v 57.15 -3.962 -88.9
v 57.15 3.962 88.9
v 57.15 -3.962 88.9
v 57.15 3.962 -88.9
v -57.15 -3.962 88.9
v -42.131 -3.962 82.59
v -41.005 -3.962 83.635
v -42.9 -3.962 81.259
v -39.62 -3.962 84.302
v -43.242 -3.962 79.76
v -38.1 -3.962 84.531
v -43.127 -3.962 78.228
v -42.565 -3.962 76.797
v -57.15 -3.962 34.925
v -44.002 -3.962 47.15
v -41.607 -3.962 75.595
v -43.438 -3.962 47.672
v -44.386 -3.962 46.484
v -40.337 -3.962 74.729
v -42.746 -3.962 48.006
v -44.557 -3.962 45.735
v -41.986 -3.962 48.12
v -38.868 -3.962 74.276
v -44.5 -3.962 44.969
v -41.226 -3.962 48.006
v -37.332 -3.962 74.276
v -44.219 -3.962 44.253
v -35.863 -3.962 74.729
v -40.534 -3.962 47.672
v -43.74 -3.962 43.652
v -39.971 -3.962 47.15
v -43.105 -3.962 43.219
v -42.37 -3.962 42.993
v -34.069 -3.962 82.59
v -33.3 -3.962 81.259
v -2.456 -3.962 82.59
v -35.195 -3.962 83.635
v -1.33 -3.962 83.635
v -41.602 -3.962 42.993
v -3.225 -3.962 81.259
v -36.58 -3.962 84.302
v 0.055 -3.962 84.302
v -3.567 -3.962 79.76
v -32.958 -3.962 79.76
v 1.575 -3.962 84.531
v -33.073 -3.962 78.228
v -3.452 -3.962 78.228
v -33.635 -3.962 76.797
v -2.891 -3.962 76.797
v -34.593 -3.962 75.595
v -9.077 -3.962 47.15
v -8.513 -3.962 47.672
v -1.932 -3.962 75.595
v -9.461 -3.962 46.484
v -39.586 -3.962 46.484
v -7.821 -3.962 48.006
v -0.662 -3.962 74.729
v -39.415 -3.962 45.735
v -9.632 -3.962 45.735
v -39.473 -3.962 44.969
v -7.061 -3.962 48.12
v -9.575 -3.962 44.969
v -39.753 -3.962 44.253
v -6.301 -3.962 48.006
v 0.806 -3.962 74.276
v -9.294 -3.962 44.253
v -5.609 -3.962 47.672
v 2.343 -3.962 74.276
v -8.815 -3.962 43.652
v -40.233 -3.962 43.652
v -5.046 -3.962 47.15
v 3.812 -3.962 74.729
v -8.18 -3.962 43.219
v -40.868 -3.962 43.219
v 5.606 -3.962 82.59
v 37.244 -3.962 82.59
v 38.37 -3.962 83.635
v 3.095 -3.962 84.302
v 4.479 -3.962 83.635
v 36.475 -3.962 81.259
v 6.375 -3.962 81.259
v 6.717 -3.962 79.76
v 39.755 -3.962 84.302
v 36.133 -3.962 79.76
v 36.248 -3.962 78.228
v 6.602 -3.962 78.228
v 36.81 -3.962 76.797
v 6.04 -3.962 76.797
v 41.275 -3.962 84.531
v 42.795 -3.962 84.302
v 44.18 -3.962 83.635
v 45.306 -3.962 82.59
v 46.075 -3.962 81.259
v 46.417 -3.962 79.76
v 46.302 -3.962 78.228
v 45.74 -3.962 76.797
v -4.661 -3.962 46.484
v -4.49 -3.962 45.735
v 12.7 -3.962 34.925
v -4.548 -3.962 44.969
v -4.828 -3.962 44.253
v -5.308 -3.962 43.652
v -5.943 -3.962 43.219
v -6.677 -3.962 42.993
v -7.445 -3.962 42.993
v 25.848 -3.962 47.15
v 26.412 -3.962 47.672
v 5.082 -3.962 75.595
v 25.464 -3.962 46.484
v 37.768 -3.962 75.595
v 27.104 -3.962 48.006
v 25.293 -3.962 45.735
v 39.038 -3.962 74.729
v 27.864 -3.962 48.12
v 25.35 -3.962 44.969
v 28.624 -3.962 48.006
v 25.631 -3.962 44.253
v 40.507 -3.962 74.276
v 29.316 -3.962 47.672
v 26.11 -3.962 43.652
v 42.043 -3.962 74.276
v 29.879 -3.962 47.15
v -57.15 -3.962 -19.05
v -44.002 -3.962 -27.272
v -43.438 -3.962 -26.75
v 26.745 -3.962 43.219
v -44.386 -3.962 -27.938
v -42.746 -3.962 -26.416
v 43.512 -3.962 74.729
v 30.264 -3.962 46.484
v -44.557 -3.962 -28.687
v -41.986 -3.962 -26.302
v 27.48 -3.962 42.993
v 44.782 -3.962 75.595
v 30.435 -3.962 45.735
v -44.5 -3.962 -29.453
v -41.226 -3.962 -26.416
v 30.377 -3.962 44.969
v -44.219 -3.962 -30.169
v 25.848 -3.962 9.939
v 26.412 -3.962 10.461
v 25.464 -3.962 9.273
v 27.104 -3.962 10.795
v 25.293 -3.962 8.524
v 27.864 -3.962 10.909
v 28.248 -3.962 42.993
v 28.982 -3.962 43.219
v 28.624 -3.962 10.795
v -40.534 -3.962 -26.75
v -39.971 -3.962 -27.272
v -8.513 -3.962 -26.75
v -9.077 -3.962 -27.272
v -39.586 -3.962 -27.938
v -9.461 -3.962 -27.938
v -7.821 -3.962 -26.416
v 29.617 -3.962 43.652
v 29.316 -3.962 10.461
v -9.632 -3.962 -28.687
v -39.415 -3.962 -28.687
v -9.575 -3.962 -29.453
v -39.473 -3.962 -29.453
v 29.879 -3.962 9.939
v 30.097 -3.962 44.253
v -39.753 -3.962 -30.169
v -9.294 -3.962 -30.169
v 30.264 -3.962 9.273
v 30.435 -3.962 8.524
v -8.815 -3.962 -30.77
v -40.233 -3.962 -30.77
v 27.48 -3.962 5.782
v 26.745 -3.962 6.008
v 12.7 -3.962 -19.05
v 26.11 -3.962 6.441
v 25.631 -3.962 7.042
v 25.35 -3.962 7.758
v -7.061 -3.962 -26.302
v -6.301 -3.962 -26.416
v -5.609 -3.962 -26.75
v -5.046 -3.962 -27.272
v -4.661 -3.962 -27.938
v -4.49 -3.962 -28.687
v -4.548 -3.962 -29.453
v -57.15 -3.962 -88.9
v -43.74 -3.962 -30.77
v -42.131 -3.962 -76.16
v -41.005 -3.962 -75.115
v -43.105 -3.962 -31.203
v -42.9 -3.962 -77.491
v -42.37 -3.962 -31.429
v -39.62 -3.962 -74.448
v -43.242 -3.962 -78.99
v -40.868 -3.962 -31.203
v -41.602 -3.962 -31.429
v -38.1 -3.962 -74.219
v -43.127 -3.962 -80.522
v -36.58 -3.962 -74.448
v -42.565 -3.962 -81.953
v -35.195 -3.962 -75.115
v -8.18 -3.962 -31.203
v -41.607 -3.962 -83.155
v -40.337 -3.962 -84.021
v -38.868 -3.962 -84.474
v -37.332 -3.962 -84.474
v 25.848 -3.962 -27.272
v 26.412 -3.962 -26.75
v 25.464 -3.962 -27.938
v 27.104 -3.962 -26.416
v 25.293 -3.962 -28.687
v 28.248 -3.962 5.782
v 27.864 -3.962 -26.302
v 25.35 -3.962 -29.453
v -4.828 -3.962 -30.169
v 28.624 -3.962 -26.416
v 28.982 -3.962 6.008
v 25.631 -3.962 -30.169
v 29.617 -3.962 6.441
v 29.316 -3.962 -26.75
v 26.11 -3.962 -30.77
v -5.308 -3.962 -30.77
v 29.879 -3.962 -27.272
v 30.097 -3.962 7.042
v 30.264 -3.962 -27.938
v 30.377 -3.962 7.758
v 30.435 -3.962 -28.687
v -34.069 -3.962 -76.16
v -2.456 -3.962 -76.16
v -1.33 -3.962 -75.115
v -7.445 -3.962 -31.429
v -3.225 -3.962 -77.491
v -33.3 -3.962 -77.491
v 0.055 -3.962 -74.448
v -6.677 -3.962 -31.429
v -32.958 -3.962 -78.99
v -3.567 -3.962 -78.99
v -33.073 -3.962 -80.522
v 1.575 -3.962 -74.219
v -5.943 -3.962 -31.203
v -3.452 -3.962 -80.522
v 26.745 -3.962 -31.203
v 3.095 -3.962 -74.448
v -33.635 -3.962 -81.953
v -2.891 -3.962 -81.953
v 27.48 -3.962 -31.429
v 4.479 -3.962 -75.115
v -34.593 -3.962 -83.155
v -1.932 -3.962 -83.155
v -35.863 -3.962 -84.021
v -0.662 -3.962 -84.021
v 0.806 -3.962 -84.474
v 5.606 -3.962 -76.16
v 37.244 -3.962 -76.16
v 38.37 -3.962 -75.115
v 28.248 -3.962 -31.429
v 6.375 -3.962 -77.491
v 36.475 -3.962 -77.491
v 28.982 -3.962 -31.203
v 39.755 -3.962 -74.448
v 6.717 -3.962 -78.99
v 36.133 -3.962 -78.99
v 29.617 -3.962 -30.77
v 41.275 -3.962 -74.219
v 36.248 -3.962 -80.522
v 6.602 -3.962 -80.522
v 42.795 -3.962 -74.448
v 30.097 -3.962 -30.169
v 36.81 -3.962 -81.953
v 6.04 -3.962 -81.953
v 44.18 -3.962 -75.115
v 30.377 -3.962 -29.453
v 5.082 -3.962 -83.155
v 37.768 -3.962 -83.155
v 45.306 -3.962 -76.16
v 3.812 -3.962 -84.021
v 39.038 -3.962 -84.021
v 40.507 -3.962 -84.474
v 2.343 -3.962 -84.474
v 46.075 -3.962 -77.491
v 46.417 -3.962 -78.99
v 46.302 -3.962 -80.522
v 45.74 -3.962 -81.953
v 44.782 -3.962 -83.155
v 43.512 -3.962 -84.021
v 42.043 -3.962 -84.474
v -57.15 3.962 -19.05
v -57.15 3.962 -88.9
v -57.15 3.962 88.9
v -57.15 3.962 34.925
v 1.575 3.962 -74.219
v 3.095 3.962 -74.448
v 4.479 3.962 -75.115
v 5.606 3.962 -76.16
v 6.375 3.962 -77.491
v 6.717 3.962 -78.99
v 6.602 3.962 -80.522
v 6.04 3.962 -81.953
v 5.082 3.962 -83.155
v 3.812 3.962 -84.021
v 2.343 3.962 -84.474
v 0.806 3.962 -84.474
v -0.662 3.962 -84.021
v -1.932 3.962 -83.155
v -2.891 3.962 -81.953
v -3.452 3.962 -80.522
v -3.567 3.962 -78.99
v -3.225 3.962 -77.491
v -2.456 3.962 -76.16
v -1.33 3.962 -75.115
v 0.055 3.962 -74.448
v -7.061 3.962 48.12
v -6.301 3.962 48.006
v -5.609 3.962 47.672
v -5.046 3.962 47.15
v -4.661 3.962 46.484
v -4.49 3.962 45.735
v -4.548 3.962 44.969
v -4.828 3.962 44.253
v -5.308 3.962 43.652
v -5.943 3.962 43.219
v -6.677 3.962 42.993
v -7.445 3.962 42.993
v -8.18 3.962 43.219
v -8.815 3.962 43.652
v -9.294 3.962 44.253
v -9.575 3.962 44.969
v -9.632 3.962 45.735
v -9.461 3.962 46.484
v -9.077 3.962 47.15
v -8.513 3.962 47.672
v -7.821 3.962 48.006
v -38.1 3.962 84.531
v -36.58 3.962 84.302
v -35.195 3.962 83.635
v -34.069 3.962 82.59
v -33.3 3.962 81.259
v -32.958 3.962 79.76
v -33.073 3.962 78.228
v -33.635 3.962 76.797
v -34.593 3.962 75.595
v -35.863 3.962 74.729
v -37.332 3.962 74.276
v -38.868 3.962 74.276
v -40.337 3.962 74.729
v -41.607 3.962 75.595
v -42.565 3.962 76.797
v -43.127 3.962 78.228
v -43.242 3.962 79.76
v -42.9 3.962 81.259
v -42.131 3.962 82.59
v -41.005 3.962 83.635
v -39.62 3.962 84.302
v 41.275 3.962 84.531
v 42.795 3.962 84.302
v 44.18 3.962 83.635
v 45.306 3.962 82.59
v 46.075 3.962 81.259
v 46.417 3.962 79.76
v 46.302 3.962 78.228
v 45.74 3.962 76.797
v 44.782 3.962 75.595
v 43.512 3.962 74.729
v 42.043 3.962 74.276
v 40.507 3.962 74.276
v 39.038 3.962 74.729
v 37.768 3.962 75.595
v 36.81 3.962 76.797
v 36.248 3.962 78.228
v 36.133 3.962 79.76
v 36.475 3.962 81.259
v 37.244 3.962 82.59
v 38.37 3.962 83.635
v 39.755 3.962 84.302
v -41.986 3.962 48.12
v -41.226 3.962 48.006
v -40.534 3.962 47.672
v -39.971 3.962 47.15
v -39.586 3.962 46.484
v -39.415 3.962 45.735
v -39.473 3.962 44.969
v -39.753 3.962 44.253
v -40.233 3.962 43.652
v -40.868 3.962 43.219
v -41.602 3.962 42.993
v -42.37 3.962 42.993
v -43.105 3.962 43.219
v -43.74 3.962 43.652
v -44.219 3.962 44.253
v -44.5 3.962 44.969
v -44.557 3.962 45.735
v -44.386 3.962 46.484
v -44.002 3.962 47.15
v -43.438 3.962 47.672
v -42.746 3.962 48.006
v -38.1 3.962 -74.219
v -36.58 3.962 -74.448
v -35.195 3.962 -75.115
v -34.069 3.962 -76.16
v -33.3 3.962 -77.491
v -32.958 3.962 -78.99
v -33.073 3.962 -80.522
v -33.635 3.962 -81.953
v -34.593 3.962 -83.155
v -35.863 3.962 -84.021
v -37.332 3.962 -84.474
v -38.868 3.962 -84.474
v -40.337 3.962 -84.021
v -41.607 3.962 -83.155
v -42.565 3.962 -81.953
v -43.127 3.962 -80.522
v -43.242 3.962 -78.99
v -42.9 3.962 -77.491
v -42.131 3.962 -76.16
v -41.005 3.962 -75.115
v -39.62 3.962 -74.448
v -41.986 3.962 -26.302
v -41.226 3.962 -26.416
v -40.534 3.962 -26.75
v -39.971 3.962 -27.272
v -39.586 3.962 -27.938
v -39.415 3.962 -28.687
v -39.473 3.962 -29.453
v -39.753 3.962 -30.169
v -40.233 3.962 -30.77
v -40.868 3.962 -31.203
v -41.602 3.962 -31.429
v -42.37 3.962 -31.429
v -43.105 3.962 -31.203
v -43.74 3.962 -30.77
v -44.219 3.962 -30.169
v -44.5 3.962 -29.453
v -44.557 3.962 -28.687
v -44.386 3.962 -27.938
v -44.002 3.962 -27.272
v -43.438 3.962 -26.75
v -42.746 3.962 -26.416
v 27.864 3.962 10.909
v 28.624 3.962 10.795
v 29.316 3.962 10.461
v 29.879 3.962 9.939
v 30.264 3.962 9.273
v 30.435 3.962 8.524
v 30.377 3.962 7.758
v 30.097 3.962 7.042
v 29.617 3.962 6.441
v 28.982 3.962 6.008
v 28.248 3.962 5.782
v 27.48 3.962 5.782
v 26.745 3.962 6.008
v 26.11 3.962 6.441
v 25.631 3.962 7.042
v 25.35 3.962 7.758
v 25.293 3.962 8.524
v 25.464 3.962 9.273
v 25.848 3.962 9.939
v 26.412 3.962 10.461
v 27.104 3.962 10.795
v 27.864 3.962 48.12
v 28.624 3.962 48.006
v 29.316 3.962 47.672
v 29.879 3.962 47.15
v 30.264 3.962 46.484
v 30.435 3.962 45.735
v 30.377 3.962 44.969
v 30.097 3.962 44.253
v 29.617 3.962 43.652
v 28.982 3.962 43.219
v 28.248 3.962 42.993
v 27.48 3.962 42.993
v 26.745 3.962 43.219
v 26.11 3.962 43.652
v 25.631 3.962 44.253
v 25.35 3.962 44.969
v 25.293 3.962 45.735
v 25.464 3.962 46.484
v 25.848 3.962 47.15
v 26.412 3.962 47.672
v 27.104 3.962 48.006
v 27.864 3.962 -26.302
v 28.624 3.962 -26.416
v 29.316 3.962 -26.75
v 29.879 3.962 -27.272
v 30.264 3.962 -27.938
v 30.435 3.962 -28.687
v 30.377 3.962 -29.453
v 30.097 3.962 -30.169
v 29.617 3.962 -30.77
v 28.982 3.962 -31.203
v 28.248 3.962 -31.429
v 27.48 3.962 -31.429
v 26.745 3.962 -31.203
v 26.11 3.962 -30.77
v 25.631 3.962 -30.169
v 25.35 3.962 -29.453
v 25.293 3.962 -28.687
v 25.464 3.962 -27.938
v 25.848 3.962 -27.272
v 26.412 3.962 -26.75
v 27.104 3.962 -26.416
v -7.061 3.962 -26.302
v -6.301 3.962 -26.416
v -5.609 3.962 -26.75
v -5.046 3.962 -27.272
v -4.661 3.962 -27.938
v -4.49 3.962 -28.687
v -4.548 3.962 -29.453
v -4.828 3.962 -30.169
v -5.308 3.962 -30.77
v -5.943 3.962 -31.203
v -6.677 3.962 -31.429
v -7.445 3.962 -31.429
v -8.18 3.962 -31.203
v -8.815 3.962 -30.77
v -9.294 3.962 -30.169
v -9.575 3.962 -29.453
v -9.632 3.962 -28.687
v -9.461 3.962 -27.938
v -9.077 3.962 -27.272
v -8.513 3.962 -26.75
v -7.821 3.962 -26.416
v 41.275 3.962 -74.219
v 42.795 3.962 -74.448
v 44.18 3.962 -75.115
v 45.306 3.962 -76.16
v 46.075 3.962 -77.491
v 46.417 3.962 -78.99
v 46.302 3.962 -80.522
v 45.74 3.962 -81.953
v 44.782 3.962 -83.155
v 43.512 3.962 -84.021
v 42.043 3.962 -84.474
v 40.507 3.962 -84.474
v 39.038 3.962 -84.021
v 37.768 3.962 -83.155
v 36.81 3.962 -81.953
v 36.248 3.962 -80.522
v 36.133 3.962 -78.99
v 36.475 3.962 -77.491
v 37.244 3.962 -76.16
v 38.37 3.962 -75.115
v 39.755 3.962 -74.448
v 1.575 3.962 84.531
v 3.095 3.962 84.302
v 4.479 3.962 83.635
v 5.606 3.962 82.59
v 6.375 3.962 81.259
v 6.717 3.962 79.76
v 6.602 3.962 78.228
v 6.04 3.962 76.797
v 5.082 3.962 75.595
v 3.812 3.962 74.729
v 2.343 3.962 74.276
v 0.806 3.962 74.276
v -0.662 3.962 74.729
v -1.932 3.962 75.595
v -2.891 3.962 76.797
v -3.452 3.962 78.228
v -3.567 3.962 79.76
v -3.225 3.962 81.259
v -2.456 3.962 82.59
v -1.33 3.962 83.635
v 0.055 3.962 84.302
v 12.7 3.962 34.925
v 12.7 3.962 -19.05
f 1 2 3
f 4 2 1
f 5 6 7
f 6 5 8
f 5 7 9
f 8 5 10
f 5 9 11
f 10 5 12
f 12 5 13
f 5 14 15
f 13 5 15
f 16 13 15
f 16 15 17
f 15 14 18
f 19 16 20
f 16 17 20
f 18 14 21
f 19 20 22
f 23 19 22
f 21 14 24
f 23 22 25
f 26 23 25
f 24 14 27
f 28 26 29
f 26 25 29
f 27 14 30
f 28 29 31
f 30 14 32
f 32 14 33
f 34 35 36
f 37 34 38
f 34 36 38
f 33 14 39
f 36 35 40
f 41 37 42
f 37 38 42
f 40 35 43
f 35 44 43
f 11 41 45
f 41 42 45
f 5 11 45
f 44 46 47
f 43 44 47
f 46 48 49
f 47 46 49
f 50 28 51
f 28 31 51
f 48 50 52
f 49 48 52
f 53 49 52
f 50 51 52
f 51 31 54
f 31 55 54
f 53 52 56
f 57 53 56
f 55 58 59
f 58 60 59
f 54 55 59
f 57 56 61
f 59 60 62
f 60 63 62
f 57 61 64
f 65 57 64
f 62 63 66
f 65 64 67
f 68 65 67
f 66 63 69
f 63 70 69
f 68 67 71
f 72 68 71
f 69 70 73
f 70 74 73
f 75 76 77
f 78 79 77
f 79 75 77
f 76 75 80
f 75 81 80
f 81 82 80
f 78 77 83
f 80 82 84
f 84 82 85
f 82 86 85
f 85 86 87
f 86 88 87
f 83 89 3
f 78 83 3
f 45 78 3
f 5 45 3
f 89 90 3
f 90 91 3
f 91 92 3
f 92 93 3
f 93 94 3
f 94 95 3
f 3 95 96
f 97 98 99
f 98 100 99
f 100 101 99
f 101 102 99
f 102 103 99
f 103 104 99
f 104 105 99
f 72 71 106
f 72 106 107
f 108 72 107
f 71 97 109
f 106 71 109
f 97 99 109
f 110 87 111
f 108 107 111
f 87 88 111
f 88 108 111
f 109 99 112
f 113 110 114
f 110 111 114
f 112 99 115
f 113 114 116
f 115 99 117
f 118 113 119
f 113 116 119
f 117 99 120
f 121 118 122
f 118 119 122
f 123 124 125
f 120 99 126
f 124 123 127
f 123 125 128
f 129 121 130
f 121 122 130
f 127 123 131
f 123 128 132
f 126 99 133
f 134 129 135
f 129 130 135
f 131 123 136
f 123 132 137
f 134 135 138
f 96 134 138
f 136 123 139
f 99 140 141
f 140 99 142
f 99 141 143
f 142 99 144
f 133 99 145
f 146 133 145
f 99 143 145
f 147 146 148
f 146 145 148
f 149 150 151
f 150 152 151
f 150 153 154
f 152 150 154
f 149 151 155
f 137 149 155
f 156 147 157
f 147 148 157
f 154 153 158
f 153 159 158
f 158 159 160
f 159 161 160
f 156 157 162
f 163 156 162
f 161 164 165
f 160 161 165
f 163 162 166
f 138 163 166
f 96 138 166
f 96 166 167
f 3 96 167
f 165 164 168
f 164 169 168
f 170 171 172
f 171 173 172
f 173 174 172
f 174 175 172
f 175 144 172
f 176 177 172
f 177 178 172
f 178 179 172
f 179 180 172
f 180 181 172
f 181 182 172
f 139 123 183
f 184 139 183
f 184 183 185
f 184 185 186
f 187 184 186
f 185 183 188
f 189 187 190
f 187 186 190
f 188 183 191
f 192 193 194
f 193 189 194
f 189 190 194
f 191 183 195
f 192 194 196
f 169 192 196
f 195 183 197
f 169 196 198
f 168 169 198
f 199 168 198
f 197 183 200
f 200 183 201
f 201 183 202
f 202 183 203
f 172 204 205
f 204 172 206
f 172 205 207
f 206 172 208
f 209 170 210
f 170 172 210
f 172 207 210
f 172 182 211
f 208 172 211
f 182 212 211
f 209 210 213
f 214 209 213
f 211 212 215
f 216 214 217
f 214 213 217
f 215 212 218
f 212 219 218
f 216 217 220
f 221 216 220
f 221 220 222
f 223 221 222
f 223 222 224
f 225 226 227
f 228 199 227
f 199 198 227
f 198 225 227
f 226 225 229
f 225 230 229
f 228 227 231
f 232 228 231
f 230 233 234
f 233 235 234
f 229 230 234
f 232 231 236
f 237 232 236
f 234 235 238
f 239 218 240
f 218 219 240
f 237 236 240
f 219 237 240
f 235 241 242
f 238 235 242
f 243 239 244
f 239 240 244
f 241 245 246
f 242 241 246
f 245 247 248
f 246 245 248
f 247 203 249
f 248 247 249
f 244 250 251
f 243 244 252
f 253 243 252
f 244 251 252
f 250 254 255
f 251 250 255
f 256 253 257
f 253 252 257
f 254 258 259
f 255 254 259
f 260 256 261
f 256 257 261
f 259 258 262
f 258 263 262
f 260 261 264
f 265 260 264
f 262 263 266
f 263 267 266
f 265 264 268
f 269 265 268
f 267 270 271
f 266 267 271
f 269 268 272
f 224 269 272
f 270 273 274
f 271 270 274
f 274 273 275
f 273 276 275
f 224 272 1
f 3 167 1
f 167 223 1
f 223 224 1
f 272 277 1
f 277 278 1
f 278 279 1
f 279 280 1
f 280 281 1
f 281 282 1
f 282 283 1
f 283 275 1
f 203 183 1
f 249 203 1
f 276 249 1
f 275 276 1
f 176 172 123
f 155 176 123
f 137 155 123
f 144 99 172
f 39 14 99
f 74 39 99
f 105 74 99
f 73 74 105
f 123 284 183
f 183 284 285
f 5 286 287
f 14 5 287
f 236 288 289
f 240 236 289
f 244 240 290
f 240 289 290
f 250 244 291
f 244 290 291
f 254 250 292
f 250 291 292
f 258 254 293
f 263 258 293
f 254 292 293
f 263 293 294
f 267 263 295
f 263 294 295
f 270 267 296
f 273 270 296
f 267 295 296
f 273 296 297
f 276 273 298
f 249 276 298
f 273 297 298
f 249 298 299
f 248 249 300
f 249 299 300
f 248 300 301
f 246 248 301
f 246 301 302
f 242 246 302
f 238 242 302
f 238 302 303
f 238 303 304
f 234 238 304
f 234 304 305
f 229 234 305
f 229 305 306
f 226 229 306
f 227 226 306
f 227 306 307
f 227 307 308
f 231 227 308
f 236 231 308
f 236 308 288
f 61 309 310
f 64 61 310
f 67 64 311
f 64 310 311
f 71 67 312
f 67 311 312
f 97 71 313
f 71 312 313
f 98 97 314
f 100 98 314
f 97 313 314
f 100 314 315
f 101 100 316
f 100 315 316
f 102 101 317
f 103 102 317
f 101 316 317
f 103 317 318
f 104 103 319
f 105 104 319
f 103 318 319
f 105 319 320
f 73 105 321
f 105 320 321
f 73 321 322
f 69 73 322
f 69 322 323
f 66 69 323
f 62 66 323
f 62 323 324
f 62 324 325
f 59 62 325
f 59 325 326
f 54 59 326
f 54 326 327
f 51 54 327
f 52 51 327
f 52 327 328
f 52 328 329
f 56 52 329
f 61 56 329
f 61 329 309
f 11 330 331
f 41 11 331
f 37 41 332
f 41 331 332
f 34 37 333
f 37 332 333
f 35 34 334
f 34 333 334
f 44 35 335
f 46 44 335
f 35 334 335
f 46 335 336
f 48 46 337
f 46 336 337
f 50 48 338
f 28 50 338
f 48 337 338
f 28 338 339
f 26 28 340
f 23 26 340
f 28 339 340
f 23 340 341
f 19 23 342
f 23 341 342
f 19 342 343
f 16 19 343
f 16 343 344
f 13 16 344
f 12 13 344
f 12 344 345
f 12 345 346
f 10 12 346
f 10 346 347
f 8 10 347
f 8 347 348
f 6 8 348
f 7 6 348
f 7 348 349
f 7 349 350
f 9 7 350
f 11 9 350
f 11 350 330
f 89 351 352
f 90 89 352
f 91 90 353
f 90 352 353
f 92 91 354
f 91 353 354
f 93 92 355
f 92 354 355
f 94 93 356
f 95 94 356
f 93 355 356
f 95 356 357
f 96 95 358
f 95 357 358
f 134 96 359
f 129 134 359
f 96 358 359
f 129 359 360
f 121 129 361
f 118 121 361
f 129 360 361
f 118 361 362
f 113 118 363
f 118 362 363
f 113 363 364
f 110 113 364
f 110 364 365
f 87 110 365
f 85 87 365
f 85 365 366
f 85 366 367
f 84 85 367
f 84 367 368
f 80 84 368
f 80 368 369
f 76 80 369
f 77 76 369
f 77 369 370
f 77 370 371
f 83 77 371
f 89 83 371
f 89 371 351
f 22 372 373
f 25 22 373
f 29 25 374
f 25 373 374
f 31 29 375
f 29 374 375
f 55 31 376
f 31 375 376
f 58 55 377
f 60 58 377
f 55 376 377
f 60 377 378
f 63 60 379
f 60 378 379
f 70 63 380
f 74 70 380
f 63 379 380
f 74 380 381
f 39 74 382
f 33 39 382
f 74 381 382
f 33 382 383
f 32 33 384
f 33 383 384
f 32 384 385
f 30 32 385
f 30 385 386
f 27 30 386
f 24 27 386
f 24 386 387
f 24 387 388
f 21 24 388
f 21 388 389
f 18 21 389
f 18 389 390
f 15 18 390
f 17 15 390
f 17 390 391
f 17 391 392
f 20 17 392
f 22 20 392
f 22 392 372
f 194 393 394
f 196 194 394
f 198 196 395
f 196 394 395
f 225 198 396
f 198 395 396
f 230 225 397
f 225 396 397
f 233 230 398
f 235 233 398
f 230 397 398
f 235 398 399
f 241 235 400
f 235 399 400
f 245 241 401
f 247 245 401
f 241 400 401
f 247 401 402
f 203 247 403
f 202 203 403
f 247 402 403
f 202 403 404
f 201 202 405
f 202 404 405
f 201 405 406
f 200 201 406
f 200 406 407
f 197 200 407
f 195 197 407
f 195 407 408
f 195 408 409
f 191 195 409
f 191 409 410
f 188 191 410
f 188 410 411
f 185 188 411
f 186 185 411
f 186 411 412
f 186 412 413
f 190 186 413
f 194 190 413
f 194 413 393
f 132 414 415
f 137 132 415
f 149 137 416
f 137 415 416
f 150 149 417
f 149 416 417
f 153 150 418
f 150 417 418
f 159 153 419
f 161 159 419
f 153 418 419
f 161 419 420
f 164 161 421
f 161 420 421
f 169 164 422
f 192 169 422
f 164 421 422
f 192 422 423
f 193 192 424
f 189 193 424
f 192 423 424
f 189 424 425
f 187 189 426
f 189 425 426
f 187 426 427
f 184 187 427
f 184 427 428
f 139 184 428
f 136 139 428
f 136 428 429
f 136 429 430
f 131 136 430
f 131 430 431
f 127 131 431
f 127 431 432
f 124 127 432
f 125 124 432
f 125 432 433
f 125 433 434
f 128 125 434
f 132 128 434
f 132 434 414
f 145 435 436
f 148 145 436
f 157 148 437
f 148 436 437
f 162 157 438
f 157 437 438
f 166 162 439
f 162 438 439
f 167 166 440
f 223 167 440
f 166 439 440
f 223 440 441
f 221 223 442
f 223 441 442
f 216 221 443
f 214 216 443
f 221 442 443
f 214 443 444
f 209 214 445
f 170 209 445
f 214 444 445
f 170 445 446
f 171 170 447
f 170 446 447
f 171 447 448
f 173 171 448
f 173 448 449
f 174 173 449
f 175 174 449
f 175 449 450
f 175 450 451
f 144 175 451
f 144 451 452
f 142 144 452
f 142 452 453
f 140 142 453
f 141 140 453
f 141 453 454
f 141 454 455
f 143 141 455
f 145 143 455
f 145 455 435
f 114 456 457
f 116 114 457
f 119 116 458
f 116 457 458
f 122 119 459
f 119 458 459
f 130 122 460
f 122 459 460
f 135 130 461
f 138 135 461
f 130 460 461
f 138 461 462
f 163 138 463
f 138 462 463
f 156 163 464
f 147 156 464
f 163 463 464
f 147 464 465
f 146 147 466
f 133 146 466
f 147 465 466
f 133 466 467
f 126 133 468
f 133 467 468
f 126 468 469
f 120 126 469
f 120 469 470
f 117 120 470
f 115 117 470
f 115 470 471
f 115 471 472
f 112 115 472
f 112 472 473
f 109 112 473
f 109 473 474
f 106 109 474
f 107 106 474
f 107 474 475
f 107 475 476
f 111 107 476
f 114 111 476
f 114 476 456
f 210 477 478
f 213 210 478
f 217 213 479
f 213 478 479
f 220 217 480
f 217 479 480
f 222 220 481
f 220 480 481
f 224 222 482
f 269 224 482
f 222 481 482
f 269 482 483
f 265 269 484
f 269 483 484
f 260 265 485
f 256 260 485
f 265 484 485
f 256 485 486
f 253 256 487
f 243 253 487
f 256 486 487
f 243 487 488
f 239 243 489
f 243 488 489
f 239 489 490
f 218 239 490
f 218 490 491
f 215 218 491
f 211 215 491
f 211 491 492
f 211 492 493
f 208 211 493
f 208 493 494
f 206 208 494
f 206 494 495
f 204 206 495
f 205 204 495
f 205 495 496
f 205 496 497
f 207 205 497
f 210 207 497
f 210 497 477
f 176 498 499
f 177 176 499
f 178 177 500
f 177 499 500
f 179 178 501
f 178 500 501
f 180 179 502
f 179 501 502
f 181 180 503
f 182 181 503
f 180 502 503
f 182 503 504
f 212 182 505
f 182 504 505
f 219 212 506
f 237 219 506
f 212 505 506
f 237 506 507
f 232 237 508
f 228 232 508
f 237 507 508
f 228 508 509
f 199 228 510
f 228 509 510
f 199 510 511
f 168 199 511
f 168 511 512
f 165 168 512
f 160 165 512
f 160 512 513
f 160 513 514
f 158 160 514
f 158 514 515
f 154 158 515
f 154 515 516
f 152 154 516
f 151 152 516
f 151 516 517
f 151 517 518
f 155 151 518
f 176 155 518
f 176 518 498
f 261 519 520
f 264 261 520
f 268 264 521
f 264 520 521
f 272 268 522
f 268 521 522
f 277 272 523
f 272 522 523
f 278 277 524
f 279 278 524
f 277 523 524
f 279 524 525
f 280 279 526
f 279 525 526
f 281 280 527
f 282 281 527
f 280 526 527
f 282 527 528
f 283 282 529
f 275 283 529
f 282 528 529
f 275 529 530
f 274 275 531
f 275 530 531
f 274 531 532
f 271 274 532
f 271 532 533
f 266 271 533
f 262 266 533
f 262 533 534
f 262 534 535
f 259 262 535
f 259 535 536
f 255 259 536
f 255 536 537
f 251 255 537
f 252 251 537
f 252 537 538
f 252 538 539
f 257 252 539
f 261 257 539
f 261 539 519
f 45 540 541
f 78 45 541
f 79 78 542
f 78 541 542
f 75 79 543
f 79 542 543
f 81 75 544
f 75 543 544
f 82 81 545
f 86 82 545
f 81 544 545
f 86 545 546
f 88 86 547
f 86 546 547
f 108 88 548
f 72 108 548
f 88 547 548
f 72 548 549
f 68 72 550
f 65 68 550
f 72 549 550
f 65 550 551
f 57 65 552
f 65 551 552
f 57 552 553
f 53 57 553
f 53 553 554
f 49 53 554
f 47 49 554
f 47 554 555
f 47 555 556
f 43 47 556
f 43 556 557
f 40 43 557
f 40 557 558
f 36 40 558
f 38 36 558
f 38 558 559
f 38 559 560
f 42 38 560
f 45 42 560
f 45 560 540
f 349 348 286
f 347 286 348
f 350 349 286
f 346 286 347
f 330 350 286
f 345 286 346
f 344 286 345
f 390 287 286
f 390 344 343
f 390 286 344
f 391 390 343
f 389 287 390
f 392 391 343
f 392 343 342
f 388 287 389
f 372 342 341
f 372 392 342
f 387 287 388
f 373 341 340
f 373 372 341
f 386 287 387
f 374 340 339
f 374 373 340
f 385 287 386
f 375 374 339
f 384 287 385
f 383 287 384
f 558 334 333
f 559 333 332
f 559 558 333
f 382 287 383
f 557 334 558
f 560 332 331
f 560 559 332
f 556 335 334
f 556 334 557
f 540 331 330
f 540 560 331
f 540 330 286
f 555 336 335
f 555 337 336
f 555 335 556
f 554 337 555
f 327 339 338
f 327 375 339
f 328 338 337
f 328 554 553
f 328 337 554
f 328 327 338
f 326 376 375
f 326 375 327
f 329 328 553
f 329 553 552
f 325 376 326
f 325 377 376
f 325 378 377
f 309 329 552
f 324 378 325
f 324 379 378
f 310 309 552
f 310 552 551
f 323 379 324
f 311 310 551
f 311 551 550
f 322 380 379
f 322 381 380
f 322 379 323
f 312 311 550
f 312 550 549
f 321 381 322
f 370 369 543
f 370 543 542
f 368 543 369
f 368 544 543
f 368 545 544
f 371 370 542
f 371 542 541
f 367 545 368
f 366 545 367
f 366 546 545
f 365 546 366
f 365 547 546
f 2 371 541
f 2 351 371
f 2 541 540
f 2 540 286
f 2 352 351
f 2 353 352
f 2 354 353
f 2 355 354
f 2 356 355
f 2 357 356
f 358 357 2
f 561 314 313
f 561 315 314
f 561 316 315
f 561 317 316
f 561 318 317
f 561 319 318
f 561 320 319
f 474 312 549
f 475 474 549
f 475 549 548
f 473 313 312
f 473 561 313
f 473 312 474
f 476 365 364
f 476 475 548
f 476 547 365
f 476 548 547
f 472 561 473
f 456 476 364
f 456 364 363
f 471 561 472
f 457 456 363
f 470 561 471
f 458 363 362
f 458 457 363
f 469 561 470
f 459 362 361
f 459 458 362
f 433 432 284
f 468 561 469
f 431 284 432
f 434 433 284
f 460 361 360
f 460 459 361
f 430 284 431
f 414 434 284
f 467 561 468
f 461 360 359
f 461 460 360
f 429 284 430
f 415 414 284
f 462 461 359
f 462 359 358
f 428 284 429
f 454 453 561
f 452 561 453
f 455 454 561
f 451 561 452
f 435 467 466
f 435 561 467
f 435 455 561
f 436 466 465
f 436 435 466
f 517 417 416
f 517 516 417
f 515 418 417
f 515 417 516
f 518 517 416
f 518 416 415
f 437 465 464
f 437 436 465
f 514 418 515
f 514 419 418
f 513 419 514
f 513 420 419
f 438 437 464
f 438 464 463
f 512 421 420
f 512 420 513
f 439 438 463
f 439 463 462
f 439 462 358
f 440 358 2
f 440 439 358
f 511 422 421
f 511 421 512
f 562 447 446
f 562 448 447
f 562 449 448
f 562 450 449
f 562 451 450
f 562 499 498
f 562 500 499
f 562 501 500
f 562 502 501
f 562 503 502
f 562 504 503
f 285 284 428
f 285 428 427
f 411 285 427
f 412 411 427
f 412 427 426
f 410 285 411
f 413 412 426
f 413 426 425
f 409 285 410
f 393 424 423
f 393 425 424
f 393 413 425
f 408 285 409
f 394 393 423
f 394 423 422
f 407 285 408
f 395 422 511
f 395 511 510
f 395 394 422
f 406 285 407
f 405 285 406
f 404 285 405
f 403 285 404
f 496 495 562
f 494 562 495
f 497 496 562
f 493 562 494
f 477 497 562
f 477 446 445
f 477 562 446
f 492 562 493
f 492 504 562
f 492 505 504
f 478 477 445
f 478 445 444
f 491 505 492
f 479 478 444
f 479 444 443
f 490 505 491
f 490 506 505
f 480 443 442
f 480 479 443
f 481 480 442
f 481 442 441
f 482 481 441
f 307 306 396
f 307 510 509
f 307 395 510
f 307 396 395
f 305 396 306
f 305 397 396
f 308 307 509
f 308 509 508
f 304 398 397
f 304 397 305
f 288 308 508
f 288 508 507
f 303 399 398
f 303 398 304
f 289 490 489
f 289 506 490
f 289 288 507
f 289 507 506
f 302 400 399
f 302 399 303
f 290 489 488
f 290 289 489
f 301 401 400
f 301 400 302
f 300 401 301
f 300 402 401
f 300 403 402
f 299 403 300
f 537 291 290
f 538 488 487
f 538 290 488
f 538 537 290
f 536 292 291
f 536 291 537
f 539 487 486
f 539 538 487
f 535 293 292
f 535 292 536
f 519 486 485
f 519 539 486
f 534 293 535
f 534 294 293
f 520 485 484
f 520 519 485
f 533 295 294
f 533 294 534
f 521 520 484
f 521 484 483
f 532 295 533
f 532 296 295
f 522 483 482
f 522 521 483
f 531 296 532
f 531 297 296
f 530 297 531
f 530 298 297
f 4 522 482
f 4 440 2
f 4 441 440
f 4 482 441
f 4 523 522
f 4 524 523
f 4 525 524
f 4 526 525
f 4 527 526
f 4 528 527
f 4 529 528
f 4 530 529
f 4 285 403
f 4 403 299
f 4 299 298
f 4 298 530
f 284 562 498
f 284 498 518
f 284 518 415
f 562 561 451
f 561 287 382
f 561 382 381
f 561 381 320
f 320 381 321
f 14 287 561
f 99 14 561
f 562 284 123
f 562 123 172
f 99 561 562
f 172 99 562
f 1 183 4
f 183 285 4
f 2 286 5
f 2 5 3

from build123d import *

# Parameters (mm, degrees)
SKETCH1_W           = 114.3
SKETCH1_H           = 177.8
BOSS_EXTRUDE1_DEPTH = 3.9624
CUT_EXTRUDE2_START  = 3.9624
SKETCH2_W           = 184.15
SKETCH2_H           = 53.975
CUT_EXTRUDE2_DEPTH  = 110.721716912
CUT_EXTRUDE4_START  = 3.9624
SKETCH3_R           = 5.1562
CUT_EXTRUDE4_DEPTH  = 110.721716912
CUT_EXTRUDE6_START  = 3.9624
SKETCH4_R           = 5.1562
CUT_EXTRUDE6_DEPTH  = 110.721716912
CUT_EXTRUDE8_START  = 3.9624
SKETCH5_R           = 5.1562
CUT_EXTRUDE8_DEPTH  = 110.721716912
CUT_EXTRUDE10_START = 3.9624
SKETCH6_R           = 2.5781
CUT_EXTRUDE10_DEPTH = 114.3
CUT_EXTRUDE12_START = 3.9624
SKETCH7_R           = 2.5781
CUT_EXTRUDE12_DEPTH = 114.3


with BuildPart() as part:
    # Sketch1 → Boss-Extrude1 (new, symmetric)
    with BuildSketch(Plane(origin=(0, 0, 0), x_dir=(1, 0, 0), z_dir=(0, 1, 0))):
        Rectangle(SKETCH1_W, SKETCH1_H)
    extrude(amount=BOSS_EXTRUDE1_DEPTH, both=True)

    # Sketch2 → Cut-Extrude2 (cut, through all)
    with BuildSketch(Plane(origin=(0, 0, 0), x_dir=(1, 0, 0), z_dir=(0, 1, 0)).offset(CUT_EXTRUDE2_START)):
        with Locations((-79.375, -7.9375)):
            Rectangle(SKETCH2_W, SKETCH2_H)
    extrude(amount=-CUT_EXTRUDE2_DEPTH, mode=Mode.SUBTRACT)

    # Sketch3 → Cut-Extrude4 (cut, through all)
    with BuildSketch(Plane(origin=(0, 0, 0), x_dir=(1, 0, 0), z_dir=(0, 1, 0)).offset(CUT_EXTRUDE4_START)):
        with Locations(Location((-38.1, -79.375, 0), (0, 0, 270))):
            Circle(SKETCH3_R)
        with Locations(Location((-38.1, 79.375, 0), (0, 0, 270))):
            Circle(SKETCH3_R)
    extrude(amount=-CUT_EXTRUDE4_DEPTH, mode=Mode.SUBTRACT)

    # Sketch4 → Cut-Extrude6 (cut, through all)
    with BuildSketch(Plane(origin=(0, 0, 0), x_dir=(1, 0, 0), z_dir=(0, 1, 0)).offset(CUT_EXTRUDE6_START)):
        with Locations(Location((1.5748, -79.375, 0), (0, 0, 270))):
            Circle(SKETCH4_R)
        with Locations(Location((1.5748, 79.375, 0), (0, 0, 270))):
            Circle(SKETCH4_R)
    extrude(amount=-CUT_EXTRUDE6_DEPTH, mode=Mode.SUBTRACT)

    # Sketch5 → Cut-Extrude8 (cut, through all)
    with BuildSketch(Plane(origin=(0, 0, 0), x_dir=(1, 0, 0), z_dir=(0, 1, 0)).offset(CUT_EXTRUDE8_START)):
        with Locations(Location((41.275, -79.375, 0), (0, 0, 270))):
            Circle(SKETCH5_R)
        with Locations(Location((41.275, 79.375, 0), (0, 0, 270))):
            Circle(SKETCH5_R)
    extrude(amount=-CUT_EXTRUDE8_DEPTH, mode=Mode.SUBTRACT)

    # Sketch6 → Cut-Extrude10 (cut)
    with BuildSketch(Plane(origin=(0, 0, 0), x_dir=(1, 0, 0), z_dir=(0, 1, 0)).offset(CUT_EXTRUDE10_START)):
        with Locations(Location((-41.9862, -45.5422, 0), (0, 0, 270))):
            Circle(SKETCH6_R)
        with Locations(Location((-7.0612, -45.5422, 0), (0, 0, 270))):
            Circle(SKETCH6_R)
        with Locations(Location((27.8638, -45.5422, 0), (0, 0, 270))):
            Circle(SKETCH6_R)
        with Locations(Location((-41.9862, 28.8798, 0), (0, 0, 270))):
            Circle(SKETCH6_R)
        with Locations(Location((-7.0612, 28.8798, 0), (0, 0, 270))):
            Circle(SKETCH6_R)
        with Locations(Location((27.8638, 28.8798, 0), (0, 0, 270))):
            Circle(SKETCH6_R)
    extrude(amount=-CUT_EXTRUDE10_DEPTH, mode=Mode.SUBTRACT)

    # Sketch7 → Cut-Extrude12 (cut)
    with BuildSketch(Plane(origin=(0, 0, 0), x_dir=(1, 0, 0), z_dir=(0, 1, 0)).offset(CUT_EXTRUDE12_START)):
        with Locations(Location((27.8638, -8.3312, 0), (0, 0, 270))):
            Circle(SKETCH7_R)
    extrude(amount=-CUT_EXTRUDE12_DEPTH, mode=Mode.SUBTRACT)


solid = part.part
